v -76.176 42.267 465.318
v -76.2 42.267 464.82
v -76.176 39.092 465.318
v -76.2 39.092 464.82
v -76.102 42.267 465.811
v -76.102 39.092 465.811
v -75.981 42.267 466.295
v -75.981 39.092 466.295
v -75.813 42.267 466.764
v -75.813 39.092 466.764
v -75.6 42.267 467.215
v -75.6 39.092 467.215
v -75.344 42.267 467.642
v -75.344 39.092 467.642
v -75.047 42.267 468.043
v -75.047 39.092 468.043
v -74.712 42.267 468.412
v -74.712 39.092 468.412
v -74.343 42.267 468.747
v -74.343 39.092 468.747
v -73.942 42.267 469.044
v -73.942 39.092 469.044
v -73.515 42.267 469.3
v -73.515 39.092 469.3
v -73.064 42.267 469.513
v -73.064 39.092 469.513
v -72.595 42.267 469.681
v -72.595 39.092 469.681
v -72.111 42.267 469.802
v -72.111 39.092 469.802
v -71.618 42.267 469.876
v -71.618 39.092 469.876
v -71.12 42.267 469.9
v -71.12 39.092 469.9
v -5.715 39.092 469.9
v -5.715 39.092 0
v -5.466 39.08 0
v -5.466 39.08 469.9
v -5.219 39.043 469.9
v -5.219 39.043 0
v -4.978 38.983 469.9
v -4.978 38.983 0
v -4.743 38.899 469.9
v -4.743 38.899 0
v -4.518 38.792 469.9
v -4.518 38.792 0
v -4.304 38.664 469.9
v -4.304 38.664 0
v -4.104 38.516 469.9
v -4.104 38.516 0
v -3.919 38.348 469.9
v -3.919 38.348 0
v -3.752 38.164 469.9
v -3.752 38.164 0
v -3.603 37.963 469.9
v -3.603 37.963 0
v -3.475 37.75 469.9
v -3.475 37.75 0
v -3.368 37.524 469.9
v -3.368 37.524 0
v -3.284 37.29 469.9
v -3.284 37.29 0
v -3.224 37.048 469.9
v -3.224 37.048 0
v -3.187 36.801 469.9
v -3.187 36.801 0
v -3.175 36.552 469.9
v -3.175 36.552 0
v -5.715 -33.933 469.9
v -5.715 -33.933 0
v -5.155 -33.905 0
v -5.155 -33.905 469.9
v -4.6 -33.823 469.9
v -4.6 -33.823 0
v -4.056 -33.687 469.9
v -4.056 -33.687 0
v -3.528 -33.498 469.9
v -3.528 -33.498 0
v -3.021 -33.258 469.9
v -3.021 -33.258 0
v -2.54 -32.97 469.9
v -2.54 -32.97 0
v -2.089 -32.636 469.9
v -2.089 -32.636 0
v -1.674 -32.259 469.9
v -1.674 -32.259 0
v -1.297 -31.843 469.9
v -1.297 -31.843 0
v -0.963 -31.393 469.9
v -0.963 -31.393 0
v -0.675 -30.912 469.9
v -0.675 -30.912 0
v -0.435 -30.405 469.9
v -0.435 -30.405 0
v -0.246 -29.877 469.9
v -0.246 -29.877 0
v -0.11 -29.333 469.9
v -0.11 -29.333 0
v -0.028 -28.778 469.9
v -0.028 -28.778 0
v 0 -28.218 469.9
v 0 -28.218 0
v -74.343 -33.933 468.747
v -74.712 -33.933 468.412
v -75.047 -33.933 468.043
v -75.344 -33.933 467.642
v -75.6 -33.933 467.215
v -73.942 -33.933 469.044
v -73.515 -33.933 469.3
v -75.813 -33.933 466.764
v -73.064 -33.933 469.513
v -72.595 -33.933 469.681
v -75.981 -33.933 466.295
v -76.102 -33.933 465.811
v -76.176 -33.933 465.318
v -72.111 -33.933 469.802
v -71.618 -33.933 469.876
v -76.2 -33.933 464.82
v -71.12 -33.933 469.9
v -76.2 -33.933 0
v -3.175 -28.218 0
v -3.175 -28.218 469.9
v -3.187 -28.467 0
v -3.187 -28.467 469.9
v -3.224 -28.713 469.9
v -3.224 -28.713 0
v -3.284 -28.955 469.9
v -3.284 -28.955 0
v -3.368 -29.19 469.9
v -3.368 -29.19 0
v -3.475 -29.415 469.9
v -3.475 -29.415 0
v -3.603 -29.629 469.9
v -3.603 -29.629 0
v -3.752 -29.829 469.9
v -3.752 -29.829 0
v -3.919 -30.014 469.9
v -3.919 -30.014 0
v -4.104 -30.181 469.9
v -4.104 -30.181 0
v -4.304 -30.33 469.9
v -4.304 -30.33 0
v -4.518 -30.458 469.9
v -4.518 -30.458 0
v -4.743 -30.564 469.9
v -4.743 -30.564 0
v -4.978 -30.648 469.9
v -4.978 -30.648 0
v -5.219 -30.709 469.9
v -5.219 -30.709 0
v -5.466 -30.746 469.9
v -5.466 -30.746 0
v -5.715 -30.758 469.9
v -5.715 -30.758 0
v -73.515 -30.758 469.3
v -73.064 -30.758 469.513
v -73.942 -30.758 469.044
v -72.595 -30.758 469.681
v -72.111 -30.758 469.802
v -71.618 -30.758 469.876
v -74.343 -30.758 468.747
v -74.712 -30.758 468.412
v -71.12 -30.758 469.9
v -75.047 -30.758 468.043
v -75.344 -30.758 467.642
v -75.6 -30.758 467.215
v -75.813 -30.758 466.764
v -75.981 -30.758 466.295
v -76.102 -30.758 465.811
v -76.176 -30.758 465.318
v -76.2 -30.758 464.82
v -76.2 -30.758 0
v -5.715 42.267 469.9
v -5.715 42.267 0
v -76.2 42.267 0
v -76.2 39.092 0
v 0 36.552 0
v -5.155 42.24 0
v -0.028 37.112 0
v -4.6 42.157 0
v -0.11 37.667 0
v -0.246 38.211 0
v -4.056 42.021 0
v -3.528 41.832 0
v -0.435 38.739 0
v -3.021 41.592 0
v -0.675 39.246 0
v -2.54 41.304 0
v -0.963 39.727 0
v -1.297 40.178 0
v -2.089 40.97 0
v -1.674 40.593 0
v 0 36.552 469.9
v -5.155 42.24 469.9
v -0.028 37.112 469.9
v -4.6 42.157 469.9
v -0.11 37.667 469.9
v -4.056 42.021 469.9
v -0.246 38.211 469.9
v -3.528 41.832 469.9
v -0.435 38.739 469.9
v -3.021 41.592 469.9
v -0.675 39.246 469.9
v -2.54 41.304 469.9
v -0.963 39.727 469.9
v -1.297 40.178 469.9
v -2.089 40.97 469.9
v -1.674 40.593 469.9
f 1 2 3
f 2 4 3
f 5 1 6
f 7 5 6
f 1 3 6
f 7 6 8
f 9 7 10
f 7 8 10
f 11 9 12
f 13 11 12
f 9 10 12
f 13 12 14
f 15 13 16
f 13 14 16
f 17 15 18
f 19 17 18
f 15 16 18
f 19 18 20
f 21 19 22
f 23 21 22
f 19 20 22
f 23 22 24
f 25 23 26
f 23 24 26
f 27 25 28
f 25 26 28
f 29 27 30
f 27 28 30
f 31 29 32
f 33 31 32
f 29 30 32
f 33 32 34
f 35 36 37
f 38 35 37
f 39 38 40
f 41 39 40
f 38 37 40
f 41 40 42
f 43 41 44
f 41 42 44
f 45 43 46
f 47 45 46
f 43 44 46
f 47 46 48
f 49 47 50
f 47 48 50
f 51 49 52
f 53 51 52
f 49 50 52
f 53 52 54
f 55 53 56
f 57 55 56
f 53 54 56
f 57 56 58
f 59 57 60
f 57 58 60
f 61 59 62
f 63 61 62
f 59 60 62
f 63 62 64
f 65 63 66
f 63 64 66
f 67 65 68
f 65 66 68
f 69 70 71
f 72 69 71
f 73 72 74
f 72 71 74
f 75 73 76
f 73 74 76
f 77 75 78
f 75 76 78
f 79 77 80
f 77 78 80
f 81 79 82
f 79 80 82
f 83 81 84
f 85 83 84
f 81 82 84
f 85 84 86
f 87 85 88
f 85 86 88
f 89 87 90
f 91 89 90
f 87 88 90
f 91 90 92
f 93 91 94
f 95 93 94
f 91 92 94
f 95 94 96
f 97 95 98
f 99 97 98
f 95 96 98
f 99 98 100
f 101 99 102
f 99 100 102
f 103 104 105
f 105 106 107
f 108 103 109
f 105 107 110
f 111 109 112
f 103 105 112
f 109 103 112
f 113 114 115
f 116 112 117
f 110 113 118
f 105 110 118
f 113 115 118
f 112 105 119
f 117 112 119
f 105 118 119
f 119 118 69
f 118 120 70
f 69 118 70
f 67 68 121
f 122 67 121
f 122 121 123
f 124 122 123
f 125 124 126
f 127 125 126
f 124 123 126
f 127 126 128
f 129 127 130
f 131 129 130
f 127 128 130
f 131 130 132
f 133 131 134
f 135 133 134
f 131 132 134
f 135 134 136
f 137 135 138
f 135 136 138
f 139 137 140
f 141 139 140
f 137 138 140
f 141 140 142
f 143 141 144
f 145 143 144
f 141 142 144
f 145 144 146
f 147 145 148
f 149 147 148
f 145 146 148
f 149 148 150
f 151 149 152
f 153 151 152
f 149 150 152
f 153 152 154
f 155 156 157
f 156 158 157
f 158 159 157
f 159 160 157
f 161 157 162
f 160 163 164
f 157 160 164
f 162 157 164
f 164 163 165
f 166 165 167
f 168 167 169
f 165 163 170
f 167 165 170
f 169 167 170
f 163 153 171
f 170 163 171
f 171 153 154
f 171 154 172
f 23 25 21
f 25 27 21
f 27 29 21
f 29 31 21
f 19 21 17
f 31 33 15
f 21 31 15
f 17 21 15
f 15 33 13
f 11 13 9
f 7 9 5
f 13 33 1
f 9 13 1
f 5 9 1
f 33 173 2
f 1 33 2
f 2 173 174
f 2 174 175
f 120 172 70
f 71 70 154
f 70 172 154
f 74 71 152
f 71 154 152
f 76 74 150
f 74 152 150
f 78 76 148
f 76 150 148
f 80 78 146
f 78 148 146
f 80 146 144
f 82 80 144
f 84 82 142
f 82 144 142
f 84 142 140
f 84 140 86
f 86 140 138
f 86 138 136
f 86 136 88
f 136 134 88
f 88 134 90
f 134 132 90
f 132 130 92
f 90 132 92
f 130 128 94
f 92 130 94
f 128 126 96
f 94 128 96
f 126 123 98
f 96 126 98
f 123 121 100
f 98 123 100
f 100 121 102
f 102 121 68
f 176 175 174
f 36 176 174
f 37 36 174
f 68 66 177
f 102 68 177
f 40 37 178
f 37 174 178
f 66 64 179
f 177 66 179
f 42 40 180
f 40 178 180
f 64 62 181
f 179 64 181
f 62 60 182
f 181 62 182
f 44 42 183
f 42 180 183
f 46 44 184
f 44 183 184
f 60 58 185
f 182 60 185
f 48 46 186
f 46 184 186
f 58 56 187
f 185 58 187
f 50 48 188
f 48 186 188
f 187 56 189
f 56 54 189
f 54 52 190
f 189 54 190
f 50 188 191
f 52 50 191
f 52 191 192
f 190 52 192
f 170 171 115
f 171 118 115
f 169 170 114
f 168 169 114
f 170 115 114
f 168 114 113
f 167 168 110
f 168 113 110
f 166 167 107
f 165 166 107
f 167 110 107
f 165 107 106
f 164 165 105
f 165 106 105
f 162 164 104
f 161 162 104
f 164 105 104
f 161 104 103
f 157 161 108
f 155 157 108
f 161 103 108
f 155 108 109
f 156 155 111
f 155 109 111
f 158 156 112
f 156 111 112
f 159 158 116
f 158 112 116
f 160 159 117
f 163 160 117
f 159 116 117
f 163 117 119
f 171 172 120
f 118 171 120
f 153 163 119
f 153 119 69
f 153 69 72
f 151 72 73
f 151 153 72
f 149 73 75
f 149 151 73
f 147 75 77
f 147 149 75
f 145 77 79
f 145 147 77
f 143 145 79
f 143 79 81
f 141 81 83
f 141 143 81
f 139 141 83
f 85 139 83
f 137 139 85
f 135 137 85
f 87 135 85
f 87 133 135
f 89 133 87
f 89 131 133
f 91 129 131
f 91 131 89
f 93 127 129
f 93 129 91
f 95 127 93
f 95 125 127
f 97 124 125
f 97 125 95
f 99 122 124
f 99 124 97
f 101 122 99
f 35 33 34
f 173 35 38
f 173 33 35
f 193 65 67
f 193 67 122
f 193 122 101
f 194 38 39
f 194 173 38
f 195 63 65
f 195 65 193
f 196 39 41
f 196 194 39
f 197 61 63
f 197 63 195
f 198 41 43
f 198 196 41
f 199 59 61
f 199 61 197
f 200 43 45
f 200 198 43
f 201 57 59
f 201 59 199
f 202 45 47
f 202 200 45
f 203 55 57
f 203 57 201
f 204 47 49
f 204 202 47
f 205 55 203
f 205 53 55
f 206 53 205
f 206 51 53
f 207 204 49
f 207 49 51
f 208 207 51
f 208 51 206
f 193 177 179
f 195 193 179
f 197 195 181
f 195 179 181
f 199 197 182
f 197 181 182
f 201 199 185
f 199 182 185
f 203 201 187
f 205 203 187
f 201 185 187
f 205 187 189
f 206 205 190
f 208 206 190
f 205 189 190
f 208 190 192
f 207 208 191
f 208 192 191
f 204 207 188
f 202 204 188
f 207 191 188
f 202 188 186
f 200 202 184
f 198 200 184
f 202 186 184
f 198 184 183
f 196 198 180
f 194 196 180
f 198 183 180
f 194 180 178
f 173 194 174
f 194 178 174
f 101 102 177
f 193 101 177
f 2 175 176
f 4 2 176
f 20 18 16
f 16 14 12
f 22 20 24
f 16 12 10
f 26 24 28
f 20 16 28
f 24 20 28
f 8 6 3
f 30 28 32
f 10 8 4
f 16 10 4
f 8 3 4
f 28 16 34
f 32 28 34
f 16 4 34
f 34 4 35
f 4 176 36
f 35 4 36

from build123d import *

# Parameters (mm, degrees)
F1_DEPTH = 469.9
F2_R     = 5.08


with BuildPart() as f1:
    # F0 (on Top) → F1 (new body)
    with BuildSketch(Plane.XY):
        with BuildLine():
            Line((-5.715, 42.267205), (-76.2, 42.267205))
            Line((-76.2, 42.267205), (-76.2, 39.092205))
            Line((-76.2, 39.092205), (-5.715, 39.092205))
            ThreePointArc((-5.715, 39.092205), (-3.918949, 38.348257), (-3.175, 36.552205))
            Line((-3.175, 36.552205), (-3.175, -28.217795))
            ThreePointArc((-3.175, -28.217795), (-3.918949, -30.013846), (-5.715, -30.757795))
            Line((-5.715, -30.757795), (-76.2, -30.757795))
            Line((-76.2, -30.757795), (-76.2, -33.932795))
            Line((-76.2, -33.932795), (-5.715, -33.932795))
            ThreePointArc((-5.715, -33.932795), (-1.673885, -32.25891), (0, -28.217795))
            Line((0, -28.217795), (0, 36.552205))
            ThreePointArc((0, 36.552205), (-1.673885, 40.593321), (-5.715, 42.267205))
        make_face()
    extrude(amount=F1_DEPTH)

    # F2
    f2_edges = [f1.edges().sort_by_distance(p)[0] for p in [
        (-76.2, -32.345295, 469.9),
        (-76.2, 40.679705, 469.9),
    ]]
    fillet(f2_edges, radius=F2_R)


solid = f1.part
